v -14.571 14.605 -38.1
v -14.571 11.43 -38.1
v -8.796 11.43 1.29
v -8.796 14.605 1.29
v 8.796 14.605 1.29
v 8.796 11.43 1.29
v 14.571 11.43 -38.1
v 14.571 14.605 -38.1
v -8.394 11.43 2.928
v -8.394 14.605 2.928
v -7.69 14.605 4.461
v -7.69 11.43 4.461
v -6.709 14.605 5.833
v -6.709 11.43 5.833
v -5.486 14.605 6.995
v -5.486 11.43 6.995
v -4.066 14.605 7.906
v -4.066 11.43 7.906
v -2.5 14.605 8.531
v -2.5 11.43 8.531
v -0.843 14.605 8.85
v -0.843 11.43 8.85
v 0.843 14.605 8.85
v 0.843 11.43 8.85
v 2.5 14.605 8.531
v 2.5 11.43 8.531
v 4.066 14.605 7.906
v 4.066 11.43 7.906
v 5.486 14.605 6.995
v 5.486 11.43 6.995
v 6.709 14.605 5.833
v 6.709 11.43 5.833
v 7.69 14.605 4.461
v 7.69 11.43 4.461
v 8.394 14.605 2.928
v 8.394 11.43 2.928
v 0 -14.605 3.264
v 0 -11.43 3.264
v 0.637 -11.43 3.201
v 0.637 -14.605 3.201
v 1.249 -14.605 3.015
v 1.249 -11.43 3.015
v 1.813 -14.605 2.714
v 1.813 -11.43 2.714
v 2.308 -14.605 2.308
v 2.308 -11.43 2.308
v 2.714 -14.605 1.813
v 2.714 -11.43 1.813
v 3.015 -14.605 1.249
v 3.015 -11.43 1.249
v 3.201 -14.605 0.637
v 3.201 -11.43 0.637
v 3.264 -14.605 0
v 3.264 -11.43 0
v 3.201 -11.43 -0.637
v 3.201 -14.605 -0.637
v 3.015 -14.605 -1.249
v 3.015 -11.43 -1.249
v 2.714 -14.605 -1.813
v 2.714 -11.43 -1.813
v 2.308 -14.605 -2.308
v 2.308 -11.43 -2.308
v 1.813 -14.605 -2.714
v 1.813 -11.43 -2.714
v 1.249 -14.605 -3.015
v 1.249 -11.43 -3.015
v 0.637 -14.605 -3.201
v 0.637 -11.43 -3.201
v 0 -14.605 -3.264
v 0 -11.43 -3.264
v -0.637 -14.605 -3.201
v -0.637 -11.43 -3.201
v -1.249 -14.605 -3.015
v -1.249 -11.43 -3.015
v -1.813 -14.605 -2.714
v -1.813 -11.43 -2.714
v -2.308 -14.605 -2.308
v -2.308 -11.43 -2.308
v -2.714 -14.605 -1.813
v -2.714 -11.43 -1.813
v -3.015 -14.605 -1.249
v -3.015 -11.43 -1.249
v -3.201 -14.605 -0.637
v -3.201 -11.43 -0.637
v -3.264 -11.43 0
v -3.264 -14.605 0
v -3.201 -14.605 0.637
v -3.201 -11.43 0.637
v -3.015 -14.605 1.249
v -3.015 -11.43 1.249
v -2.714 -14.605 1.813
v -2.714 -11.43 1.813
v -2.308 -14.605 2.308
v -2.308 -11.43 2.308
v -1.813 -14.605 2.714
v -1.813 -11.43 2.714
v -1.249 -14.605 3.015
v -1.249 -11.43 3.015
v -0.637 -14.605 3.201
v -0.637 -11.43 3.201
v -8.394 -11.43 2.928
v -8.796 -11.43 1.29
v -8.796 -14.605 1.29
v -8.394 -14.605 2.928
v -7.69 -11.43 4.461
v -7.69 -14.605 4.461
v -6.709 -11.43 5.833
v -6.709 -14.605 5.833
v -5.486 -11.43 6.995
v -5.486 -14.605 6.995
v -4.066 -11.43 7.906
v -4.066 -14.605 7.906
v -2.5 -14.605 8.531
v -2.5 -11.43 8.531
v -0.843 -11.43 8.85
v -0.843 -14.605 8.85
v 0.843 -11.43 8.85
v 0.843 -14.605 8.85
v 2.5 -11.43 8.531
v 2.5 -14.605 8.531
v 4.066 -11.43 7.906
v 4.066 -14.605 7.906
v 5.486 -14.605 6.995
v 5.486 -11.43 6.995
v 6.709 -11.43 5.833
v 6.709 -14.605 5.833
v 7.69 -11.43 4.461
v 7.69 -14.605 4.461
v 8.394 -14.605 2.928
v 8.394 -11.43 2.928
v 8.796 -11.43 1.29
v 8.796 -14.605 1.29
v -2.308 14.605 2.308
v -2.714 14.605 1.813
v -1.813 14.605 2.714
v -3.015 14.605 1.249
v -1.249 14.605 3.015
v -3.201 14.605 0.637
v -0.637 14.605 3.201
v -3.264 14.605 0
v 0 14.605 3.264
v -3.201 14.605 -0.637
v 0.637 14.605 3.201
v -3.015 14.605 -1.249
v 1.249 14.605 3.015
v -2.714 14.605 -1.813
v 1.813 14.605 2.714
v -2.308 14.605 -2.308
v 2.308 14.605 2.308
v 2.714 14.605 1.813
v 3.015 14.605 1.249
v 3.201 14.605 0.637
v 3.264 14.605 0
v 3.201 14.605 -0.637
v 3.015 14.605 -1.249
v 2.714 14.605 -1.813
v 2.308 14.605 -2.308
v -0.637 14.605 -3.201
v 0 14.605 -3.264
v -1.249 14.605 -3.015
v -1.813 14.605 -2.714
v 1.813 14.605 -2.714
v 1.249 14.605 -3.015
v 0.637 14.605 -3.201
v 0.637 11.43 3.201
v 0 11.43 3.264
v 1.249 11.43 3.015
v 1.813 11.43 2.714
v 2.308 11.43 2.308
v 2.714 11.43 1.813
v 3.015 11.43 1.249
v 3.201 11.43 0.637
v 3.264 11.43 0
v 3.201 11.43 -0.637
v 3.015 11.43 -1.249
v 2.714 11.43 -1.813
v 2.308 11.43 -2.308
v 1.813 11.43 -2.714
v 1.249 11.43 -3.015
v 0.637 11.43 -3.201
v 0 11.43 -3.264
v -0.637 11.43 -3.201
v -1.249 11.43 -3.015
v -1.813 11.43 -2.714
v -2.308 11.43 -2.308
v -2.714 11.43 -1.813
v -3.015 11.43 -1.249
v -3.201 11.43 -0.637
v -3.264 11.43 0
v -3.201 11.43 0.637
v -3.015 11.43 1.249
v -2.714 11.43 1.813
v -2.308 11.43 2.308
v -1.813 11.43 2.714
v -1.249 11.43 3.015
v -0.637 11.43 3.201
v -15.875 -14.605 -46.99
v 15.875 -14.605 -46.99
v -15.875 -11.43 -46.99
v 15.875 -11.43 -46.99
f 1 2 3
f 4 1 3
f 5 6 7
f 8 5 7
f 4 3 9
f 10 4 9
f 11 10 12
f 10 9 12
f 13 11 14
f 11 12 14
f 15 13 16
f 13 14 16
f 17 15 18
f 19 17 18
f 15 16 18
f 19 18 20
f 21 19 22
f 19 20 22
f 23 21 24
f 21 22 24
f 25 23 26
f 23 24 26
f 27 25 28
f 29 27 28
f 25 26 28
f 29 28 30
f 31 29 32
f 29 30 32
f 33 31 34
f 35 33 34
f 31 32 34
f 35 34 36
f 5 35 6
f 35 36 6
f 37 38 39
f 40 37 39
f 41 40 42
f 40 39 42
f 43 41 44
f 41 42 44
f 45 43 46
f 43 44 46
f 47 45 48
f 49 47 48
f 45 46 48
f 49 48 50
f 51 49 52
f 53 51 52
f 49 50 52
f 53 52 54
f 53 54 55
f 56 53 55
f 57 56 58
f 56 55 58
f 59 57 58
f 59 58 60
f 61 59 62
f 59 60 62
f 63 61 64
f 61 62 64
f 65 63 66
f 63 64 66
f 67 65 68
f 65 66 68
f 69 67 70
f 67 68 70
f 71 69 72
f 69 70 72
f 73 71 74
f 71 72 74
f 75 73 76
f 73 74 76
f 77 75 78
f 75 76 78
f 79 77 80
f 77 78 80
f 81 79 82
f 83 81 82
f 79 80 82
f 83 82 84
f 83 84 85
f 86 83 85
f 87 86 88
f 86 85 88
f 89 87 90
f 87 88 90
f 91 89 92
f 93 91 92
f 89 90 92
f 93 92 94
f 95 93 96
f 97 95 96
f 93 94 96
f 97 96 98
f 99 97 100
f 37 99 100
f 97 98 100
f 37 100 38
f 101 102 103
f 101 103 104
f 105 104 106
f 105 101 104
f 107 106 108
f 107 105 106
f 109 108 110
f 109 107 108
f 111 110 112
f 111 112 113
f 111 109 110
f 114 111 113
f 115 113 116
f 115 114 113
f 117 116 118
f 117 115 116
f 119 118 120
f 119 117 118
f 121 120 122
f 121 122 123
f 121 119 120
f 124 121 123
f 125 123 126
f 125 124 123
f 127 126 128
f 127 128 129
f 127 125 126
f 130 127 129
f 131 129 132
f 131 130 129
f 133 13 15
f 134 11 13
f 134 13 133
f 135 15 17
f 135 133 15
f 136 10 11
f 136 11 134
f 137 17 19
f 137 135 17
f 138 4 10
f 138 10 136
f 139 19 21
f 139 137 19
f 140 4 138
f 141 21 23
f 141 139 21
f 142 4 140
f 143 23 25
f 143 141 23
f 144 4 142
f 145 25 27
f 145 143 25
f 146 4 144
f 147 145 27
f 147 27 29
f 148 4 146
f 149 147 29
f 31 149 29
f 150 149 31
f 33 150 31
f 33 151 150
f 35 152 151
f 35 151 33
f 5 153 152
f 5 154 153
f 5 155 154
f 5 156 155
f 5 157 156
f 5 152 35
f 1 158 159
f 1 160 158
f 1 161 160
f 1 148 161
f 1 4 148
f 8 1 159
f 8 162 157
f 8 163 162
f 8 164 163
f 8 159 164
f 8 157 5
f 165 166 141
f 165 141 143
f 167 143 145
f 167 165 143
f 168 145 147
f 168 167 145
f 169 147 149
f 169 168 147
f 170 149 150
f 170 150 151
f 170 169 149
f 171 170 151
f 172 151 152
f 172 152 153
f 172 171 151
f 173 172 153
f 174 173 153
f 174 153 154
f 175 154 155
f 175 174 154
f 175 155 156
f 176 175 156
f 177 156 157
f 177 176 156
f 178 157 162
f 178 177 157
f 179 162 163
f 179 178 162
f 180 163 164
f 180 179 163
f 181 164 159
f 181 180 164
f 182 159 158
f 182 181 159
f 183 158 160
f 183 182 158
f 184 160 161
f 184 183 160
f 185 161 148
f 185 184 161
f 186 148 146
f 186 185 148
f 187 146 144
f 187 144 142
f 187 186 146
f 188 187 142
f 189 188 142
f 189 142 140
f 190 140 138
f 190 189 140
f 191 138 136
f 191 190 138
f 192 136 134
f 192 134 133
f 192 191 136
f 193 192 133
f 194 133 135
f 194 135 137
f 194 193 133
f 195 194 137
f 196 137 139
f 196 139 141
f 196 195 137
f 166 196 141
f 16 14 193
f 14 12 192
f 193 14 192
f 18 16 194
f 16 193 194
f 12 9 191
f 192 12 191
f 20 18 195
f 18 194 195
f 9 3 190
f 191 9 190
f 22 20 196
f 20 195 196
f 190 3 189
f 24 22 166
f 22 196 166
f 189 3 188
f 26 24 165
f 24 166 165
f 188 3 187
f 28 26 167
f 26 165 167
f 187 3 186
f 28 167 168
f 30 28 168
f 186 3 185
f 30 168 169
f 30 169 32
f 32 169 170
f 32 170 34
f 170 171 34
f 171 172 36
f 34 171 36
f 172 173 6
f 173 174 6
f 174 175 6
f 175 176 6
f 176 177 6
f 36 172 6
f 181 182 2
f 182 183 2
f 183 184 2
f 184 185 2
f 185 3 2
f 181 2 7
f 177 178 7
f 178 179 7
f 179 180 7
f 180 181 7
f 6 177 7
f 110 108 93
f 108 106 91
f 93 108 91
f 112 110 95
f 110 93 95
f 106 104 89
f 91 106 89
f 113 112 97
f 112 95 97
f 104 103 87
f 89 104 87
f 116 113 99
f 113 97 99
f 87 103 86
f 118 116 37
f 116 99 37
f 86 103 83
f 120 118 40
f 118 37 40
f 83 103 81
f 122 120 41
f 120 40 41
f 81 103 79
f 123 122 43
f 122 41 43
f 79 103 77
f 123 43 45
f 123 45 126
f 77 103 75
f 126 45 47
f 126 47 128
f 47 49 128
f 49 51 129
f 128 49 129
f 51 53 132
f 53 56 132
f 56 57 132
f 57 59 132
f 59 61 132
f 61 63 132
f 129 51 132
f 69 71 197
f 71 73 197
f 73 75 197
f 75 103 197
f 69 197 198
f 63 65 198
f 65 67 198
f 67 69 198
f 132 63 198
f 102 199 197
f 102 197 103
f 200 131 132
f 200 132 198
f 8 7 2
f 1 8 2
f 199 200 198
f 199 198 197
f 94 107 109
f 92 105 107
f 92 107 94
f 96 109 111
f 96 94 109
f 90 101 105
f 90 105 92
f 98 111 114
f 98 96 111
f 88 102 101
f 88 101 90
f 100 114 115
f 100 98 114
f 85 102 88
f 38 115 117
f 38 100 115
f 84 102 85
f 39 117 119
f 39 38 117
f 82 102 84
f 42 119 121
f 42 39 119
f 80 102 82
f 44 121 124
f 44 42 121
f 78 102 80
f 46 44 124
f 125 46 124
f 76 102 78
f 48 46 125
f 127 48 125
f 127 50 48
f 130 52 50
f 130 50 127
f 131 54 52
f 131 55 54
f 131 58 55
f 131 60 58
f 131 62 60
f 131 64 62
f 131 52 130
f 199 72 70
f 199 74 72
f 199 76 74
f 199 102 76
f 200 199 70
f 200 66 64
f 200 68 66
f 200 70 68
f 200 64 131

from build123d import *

# Parameters (mm, degrees)
BOSS_EXTRUDE1_START = 11.43
SKETCH2_R           = 3.2639
BOSS_EXTRUDE1_DEPTH = 3.175
BOSS_EXTRUDE2_START = -11.43
SKETCH2_3_R         = 3.2639
BOSS_EXTRUDE2_DEPTH = 3.175


with BuildPart() as part:
    # Sketch2 → Boss-Extrude1 (new body)
    with BuildSketch(Plane(origin=(0, 0, 0), x_dir=(1, 0, 0), z_dir=(0, 1, 0)).offset(BOSS_EXTRUDE1_START)):
        with BuildLine():
            ThreePointArc((-8.795950238, -1.289712918), (0, -8.89), (8.795950238, -1.289712918))
            Line((8.795950238, -1.289712918), (14.571496964, 38.1))
            Line((14.571496964, 38.1), (-14.571496964, 38.1))
            Line((-14.571496964, 38.1), (-8.795950238, -1.289712918))
        make_face()
        with Locations(Location((0, 0, 0), (0, 0, 270))):
            Circle(SKETCH2_R, mode=Mode.SUBTRACT)
    extrude(amount=BOSS_EXTRUDE1_DEPTH)


with BuildPart() as body_2:
    # Sketch2<3> → Boss-Extrude2 (new body)
    with BuildSketch(Plane(origin=(0, 0, 0), x_dir=(1, 0, 0), z_dir=(0, 1, 0)).offset(BOSS_EXTRUDE2_START)):
        with BuildLine():
            Line((-15.875, 46.99), (-8.795950238, -1.289712918))
            ThreePointArc((-8.795950238, -1.289712918), (0, -8.89), (8.795950238, -1.289712918))
            Line((8.795950238, -1.289712918), (15.875, 46.99))
            Line((15.875, 46.99), (-15.875, 46.99))
        make_face()
        with Locations(Location((0, 0, 0), (0, 0, 270))):
            Circle(SKETCH2_3_R, mode=Mode.SUBTRACT)
    extrude(amount=-BOSS_EXTRUDE2_DEPTH)


solid = Compound([part.part, body_2.part])
